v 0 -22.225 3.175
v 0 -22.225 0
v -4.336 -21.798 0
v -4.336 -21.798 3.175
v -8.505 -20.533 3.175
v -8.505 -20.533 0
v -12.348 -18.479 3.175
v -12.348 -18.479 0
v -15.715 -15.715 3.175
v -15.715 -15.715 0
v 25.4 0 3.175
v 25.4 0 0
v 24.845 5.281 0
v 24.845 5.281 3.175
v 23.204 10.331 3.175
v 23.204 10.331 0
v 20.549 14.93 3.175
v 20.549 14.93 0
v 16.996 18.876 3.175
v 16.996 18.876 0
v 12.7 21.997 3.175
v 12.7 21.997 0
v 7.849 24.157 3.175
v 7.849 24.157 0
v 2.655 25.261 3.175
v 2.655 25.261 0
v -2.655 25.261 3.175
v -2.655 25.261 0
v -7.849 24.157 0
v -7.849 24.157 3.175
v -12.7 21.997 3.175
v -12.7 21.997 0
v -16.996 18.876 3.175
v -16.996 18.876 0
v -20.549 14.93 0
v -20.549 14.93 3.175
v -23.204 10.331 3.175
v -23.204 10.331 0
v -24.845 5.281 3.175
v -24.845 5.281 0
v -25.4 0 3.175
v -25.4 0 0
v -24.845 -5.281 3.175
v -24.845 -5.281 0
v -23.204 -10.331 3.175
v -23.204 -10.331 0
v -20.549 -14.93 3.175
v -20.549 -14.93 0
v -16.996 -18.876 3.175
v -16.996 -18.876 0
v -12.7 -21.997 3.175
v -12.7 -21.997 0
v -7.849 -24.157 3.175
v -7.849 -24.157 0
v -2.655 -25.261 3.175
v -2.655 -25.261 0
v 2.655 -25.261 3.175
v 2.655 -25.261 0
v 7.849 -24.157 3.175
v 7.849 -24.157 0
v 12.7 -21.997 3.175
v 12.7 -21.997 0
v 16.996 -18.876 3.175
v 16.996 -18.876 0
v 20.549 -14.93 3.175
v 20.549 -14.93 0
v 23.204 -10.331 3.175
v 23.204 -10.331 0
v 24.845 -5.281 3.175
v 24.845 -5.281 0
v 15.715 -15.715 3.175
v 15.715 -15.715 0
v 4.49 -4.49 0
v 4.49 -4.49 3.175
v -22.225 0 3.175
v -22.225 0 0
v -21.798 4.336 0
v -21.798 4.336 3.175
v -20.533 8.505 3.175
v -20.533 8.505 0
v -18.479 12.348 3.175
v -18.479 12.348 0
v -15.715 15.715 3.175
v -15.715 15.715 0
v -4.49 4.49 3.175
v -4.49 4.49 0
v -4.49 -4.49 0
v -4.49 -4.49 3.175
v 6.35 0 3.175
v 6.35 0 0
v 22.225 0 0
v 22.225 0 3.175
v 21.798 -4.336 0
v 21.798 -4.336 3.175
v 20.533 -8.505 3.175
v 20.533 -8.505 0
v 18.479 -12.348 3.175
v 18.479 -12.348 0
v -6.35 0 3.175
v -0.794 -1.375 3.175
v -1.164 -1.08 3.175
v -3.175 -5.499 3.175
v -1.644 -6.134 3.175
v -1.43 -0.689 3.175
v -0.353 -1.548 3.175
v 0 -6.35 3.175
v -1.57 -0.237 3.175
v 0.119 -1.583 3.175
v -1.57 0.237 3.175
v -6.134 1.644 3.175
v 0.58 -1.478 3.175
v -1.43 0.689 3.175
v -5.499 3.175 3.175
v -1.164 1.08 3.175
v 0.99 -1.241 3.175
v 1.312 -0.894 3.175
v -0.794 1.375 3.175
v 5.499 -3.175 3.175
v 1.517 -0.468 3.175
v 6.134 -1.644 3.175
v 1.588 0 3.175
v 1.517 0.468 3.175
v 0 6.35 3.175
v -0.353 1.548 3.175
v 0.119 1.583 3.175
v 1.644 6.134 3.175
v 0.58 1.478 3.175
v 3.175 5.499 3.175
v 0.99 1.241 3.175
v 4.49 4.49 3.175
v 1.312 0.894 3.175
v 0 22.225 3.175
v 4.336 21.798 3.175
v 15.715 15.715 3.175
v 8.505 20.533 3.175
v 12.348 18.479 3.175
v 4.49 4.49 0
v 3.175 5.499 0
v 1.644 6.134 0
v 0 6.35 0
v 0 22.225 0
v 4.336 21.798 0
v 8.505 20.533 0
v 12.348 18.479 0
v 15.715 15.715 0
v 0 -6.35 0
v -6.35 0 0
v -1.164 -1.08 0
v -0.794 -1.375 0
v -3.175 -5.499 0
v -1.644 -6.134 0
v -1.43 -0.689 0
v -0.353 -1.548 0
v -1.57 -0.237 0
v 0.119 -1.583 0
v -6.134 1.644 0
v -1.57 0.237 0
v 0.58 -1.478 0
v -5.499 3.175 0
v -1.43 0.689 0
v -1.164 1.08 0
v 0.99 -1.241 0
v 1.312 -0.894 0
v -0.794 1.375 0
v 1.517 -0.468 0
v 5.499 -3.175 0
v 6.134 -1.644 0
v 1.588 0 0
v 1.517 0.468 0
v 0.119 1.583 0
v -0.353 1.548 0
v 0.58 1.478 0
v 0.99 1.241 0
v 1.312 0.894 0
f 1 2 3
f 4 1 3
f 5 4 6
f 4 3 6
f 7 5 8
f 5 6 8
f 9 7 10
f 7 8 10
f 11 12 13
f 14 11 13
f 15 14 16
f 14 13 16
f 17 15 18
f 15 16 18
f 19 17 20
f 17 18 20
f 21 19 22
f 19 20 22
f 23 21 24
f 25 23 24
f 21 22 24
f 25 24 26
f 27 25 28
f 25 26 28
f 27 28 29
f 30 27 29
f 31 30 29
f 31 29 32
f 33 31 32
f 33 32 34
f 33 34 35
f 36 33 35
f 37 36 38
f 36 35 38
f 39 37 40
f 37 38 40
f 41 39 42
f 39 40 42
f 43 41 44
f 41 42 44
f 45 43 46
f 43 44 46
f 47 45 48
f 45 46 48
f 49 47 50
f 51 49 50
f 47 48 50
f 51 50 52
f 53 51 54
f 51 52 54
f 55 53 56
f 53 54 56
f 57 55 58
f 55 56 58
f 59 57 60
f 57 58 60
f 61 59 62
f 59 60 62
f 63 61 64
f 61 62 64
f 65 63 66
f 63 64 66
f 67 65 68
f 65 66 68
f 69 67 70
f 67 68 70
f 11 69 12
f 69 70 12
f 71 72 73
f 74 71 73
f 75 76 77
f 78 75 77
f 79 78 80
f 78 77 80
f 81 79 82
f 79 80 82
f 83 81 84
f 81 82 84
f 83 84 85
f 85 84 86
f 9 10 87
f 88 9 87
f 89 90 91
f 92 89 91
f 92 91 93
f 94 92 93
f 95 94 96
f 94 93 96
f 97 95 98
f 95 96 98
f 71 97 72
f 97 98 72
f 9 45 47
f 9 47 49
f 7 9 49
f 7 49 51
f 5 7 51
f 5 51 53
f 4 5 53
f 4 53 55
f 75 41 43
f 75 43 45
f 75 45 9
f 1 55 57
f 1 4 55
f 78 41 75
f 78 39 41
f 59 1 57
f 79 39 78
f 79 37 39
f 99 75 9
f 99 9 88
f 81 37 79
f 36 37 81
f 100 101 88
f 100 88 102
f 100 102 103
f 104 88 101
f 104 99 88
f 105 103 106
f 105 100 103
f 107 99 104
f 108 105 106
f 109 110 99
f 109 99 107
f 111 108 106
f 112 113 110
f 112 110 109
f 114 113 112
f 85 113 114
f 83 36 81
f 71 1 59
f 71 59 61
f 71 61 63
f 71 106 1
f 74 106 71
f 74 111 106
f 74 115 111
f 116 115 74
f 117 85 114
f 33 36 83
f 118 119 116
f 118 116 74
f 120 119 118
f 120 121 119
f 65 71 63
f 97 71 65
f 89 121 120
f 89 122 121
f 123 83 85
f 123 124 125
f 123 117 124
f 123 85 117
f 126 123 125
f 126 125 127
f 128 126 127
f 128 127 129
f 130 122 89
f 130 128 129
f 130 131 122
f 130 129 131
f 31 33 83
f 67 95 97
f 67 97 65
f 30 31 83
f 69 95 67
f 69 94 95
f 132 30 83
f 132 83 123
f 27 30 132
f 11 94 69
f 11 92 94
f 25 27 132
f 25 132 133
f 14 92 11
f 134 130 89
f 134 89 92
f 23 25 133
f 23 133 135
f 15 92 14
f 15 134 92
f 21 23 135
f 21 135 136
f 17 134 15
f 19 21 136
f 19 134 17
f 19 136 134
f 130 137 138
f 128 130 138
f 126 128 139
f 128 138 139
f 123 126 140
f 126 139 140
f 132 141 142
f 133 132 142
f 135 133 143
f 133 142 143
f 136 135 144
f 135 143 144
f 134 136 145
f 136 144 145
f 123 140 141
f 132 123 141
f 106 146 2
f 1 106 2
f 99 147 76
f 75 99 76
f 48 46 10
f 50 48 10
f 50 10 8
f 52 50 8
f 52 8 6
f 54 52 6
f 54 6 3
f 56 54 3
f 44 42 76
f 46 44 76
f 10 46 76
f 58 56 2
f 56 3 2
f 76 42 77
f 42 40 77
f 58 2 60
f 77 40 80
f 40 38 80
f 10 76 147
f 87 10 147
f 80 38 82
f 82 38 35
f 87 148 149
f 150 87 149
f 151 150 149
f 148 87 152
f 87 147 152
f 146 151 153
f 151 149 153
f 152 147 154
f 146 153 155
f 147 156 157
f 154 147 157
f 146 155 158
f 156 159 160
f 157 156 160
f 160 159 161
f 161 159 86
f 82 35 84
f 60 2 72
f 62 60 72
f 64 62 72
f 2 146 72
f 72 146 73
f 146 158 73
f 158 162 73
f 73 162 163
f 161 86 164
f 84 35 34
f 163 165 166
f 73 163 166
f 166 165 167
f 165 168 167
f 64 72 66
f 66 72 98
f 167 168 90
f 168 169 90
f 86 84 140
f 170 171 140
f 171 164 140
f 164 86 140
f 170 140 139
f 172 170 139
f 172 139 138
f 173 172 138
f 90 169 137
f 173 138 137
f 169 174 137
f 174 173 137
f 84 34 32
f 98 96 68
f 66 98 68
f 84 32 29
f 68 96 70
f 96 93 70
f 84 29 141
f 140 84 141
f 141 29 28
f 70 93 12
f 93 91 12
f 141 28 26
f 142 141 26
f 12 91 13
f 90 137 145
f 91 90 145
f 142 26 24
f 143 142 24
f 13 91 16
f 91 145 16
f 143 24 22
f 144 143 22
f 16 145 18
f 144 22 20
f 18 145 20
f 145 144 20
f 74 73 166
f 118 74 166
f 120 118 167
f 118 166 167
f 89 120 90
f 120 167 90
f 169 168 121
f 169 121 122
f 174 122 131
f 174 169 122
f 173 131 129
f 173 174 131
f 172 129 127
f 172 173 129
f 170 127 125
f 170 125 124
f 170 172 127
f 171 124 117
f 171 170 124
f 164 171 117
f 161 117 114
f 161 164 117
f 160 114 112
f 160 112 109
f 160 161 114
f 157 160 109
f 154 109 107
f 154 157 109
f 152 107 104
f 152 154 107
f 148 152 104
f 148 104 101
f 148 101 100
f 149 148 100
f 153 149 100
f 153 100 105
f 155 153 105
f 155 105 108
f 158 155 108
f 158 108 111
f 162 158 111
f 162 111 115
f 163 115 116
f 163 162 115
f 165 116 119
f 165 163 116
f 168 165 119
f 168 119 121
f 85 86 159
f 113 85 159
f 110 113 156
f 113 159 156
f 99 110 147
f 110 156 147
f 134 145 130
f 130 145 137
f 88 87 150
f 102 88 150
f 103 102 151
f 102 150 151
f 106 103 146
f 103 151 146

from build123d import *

# Parameters (mm, degrees)
F0_R     = 25.4
F0_R_2   = 1.5875
F1_DEPTH = 3.175


with BuildPart() as f1:
    # F0 (on Top) → F1 (new body)
    with BuildSketch(Plane.XY):
        Circle(F0_R)
        with BuildLine():
            ThreePointArc((15.7154482119, 15.7154482119), (20.5332226101, 8.5051392843), (22.225, 0))
            ThreePointArc((22.225, 0), (20.5332226101, -8.5051392843), (15.7154482119, -15.7154482119))
            ThreePointArc((15.7154482119, -15.7154482119), (8.5051392843, -20.5332226101), (0, -22.225))
            ThreePointArc((0, -22.225), (-8.5051392843, -20.5332226101), (-15.7154482119, -15.7154482119))
            ThreePointArc((-15.7154482119, -15.7154482119), (-20.5332226101, -8.5051392843), (-22.225, 0))
            ThreePointArc((-22.225, 0), (-20.5332226101, 8.5051392843), (-15.7154482119, 15.7154482119))
            ThreePointArc((-15.7154482119, 15.7154482119), (-8.5051392843, 20.5332226101), (0, 22.225))
            ThreePointArc((0, 22.225), (8.5051392843, 20.5332226101), (15.7154482119, 15.7154482119))
        make_face(mode=Mode.SUBTRACT)
        with BuildLine():
            Line((0, 6.35), (0, 22.225))
            ThreePointArc((0, 22.225), (-8.5051392843, 20.5332226101), (-15.7154482119, 15.7154482119))
            Line((-15.7154482119, 15.7154482119), (-4.4901280605, 4.4901280605))
            ThreePointArc((-4.4901280605, 4.4901280605), (-2.4300397955, 5.8666350314), (0, 6.35))
        make_face()
        with BuildLine():
            Line((6.35, 0), (22.225, 0))
            ThreePointArc((22.225, 0), (20.5332226101, 8.5051392843), (15.7154482119, 15.7154482119))
            Line((15.7154482119, 15.7154482119), (4.4901280605, 4.4901280605))
            ThreePointArc((4.4901280605, 4.4901280605), (5.8666350314, 2.4300397955), (6.35, 0))
        make_face()
        with BuildLine():
            ThreePointArc((0, -22.225), (8.5051392843, -20.5332226101), (15.7154482119, -15.7154482119))
            Line((15.7154482119, -15.7154482119), (4.4901280605, -4.4901280605))
            ThreePointArc((4.4901280605, -4.4901280605), (2.4300397955, -5.8666350314), (0, -6.35))
            Line((0, -6.35), (0, -22.225))
        make_face()
        with BuildLine():
            ThreePointArc((-22.225, 0), (-20.5332226101, -8.5051392843), (-15.7154482119, -15.7154482119))
            Line((-15.7154482119, -15.7154482119), (-4.4901280605, -4.4901280605))
            ThreePointArc((-4.4901280605, -4.4901280605), (-5.8666350314, -2.4300397955), (-6.35, 0))
            Line((-6.35, 0), (-22.225, 0))
        make_face()
        with BuildLine():
            ThreePointArc((4.4901280605, -4.4901280605), (5.8666350314, -2.4300397955), (6.35, 0))
            ThreePointArc((6.35, 0), (5.8666350314, 2.4300397955), (4.4901280605, 4.4901280605))
            ThreePointArc((4.4901280605, 4.4901280605), (2.4300397955, 5.8666350314), (0, 6.35))
            ThreePointArc((0, 6.35), (-2.4300397955, 5.8666350314), (-4.4901280605, 4.4901280605))
            ThreePointArc((-4.4901280605, 4.4901280605), (-5.8666350314, 2.4300397955), (-6.35, 0))
            ThreePointArc((-6.35, 0), (-5.8666350314, -2.4300397955), (-4.4901280605, -4.4901280605))
            ThreePointArc((-4.4901280605, -4.4901280605), (-2.4300397955, -5.8666350314), (0, -6.35))
            ThreePointArc((0, -6.35), (2.4300397955, -5.8666350314), (4.4901280605, -4.4901280605))
        make_face()
        Circle(F0_R_2, mode=Mode.SUBTRACT)
    extrude(amount=F1_DEPTH)


solid = f1.part
